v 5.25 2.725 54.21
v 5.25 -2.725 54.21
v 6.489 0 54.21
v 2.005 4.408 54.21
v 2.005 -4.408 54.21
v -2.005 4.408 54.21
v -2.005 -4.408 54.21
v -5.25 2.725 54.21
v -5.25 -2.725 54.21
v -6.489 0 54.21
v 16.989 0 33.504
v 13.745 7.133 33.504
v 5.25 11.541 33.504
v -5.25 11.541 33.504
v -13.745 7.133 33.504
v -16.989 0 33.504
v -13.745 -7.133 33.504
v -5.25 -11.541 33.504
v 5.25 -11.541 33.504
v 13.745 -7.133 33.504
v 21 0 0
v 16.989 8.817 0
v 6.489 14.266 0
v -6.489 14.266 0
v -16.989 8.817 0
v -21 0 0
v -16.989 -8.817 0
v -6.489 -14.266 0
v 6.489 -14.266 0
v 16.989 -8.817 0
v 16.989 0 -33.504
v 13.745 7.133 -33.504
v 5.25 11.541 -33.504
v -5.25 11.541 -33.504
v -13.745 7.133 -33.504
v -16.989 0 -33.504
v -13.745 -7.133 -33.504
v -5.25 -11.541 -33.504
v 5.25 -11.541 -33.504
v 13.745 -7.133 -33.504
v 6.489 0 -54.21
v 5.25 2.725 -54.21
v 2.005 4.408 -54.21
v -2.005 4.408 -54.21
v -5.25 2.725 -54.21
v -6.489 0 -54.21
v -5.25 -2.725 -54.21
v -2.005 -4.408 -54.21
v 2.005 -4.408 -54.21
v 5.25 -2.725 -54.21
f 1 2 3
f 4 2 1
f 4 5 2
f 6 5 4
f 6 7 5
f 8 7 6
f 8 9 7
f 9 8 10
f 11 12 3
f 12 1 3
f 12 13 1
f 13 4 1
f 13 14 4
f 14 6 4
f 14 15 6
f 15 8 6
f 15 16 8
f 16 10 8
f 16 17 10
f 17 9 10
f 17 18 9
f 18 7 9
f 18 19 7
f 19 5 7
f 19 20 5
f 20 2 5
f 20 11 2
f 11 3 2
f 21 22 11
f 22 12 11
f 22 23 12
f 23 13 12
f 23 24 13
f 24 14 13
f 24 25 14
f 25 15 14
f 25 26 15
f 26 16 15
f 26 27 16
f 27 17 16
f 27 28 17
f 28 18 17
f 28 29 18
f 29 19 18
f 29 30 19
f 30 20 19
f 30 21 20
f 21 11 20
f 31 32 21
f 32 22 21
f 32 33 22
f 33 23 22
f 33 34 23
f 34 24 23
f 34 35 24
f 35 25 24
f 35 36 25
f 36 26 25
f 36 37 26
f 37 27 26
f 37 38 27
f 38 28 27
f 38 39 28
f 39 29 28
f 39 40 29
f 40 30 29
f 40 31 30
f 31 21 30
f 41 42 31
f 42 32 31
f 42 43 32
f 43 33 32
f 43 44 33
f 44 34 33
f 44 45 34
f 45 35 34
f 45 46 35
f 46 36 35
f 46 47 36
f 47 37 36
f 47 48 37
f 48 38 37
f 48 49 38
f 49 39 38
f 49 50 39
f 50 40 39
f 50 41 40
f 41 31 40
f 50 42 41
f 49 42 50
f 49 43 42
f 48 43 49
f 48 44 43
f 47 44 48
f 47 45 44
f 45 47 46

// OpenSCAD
// Generated by SolidPython 1.0.1 on 2020-07-29 00:46:47


scale(v = [7, 5, 19]) {
	sphere(r = 3);
}
/***********************************************
*********      SolidPython code:      **********
************************************************
 
# import packages: SolidPython
from solid import *
from solid.utils import *
from itertools import chain, combinations, permutations


class Resize:

    def __init__(self, scad_file):
        self.scad_file = scad_file
        #self.scad_file = import_scad(scad_file)
        # cone/cylinder param:
        self.r1 = 0
        self.r2 = 0
        self.h = 0
        # rectangular prism param:
        self.w = 0
        self.l = 0
        # ellipse param:
        self.r = 0

    # import OpenScad code (file name corresponds to shape)


    # classify shape + parameters
    def assign(self, param1, param2, param3):
        if self.scad_file == 'cone.scad':
            self.r1 = param1
            self.r2 = param2
            self.h = param3
        elif self.scad_file == 'cylinder.scad':
            self.r1 = param1
            self.r2 = param2
            self.h = param3
        elif self.scad_file == 'rectangularPrism.scad':
            self.h = param1
            self.l = param2
            self.w = param3
        else:
            self.r = param1
            self.h = param2

    # resize parameters
    def iterate(self):
        x = range(3, 20, 2)
        i = 1
        if self.scad_file == 'cone.scad':
            tempList = list(permutations(x, 2))
            for temp in tempList:
                param1 = temp[0]
                param2 = temp[1]
                filepath = 'produced_scad_files/' + 'cone' + str(param1) + '_' + str(param2) + '_' + '.scad'
                scad_render_to_file(cylinder(h=param1, r1=param2, r2=0), filepath)

        elif self.scad_file == 'cylinder.scad':
            tempList = list(permutations(x, 3))
            for temp in tempList:
                param1 = temp[0]
                param2 = temp[1]
                filepath = 'produced_scad_files/' + 'cylinder' + str(param1) + '_' + str(param2) + '_' + '.scad'
                scad_render_to_file(cylinder(h=param1, r1=param2, r2=param2), filepath)

        elif self.scad_file == 'rectangularPrism.scad':
            tempList = list(permutations(x, 3))
            for temp in tempList:
                param1 = temp[0]
                param2 = temp[1]
                param3 = temp[2]
                filepath = 'produced_scad_files/' + 'rectangularPrism' + str(param1) + '_' + str(param2) + '_' + str(
                    param3) + '.scad'
                scad_render_to_file(cube(size=(param1, param2, param3)), filepath)

        elif self.scad_file == 'ellipse.scad':
            tempList = list(permutations(x, 4))
            for temp in tempList:
                param1 = temp[0]
                param2 = temp[1]
                param3 = temp[2]
                param4 = temp[3]
                filepath = 'produced_scad_files/' + 'ellipse' + str(param1) + '_' + str(param2) + '_' + str(param3) + '_' + str(param4) + '.scad'
                scad_render_to_file(scale([param1, param2, param3])(sphere(r=param4)), filepath)

    def render_to_scadfile(self):
        scad_render_to_file(scad, 'example.scad') 
 
************************************************/
